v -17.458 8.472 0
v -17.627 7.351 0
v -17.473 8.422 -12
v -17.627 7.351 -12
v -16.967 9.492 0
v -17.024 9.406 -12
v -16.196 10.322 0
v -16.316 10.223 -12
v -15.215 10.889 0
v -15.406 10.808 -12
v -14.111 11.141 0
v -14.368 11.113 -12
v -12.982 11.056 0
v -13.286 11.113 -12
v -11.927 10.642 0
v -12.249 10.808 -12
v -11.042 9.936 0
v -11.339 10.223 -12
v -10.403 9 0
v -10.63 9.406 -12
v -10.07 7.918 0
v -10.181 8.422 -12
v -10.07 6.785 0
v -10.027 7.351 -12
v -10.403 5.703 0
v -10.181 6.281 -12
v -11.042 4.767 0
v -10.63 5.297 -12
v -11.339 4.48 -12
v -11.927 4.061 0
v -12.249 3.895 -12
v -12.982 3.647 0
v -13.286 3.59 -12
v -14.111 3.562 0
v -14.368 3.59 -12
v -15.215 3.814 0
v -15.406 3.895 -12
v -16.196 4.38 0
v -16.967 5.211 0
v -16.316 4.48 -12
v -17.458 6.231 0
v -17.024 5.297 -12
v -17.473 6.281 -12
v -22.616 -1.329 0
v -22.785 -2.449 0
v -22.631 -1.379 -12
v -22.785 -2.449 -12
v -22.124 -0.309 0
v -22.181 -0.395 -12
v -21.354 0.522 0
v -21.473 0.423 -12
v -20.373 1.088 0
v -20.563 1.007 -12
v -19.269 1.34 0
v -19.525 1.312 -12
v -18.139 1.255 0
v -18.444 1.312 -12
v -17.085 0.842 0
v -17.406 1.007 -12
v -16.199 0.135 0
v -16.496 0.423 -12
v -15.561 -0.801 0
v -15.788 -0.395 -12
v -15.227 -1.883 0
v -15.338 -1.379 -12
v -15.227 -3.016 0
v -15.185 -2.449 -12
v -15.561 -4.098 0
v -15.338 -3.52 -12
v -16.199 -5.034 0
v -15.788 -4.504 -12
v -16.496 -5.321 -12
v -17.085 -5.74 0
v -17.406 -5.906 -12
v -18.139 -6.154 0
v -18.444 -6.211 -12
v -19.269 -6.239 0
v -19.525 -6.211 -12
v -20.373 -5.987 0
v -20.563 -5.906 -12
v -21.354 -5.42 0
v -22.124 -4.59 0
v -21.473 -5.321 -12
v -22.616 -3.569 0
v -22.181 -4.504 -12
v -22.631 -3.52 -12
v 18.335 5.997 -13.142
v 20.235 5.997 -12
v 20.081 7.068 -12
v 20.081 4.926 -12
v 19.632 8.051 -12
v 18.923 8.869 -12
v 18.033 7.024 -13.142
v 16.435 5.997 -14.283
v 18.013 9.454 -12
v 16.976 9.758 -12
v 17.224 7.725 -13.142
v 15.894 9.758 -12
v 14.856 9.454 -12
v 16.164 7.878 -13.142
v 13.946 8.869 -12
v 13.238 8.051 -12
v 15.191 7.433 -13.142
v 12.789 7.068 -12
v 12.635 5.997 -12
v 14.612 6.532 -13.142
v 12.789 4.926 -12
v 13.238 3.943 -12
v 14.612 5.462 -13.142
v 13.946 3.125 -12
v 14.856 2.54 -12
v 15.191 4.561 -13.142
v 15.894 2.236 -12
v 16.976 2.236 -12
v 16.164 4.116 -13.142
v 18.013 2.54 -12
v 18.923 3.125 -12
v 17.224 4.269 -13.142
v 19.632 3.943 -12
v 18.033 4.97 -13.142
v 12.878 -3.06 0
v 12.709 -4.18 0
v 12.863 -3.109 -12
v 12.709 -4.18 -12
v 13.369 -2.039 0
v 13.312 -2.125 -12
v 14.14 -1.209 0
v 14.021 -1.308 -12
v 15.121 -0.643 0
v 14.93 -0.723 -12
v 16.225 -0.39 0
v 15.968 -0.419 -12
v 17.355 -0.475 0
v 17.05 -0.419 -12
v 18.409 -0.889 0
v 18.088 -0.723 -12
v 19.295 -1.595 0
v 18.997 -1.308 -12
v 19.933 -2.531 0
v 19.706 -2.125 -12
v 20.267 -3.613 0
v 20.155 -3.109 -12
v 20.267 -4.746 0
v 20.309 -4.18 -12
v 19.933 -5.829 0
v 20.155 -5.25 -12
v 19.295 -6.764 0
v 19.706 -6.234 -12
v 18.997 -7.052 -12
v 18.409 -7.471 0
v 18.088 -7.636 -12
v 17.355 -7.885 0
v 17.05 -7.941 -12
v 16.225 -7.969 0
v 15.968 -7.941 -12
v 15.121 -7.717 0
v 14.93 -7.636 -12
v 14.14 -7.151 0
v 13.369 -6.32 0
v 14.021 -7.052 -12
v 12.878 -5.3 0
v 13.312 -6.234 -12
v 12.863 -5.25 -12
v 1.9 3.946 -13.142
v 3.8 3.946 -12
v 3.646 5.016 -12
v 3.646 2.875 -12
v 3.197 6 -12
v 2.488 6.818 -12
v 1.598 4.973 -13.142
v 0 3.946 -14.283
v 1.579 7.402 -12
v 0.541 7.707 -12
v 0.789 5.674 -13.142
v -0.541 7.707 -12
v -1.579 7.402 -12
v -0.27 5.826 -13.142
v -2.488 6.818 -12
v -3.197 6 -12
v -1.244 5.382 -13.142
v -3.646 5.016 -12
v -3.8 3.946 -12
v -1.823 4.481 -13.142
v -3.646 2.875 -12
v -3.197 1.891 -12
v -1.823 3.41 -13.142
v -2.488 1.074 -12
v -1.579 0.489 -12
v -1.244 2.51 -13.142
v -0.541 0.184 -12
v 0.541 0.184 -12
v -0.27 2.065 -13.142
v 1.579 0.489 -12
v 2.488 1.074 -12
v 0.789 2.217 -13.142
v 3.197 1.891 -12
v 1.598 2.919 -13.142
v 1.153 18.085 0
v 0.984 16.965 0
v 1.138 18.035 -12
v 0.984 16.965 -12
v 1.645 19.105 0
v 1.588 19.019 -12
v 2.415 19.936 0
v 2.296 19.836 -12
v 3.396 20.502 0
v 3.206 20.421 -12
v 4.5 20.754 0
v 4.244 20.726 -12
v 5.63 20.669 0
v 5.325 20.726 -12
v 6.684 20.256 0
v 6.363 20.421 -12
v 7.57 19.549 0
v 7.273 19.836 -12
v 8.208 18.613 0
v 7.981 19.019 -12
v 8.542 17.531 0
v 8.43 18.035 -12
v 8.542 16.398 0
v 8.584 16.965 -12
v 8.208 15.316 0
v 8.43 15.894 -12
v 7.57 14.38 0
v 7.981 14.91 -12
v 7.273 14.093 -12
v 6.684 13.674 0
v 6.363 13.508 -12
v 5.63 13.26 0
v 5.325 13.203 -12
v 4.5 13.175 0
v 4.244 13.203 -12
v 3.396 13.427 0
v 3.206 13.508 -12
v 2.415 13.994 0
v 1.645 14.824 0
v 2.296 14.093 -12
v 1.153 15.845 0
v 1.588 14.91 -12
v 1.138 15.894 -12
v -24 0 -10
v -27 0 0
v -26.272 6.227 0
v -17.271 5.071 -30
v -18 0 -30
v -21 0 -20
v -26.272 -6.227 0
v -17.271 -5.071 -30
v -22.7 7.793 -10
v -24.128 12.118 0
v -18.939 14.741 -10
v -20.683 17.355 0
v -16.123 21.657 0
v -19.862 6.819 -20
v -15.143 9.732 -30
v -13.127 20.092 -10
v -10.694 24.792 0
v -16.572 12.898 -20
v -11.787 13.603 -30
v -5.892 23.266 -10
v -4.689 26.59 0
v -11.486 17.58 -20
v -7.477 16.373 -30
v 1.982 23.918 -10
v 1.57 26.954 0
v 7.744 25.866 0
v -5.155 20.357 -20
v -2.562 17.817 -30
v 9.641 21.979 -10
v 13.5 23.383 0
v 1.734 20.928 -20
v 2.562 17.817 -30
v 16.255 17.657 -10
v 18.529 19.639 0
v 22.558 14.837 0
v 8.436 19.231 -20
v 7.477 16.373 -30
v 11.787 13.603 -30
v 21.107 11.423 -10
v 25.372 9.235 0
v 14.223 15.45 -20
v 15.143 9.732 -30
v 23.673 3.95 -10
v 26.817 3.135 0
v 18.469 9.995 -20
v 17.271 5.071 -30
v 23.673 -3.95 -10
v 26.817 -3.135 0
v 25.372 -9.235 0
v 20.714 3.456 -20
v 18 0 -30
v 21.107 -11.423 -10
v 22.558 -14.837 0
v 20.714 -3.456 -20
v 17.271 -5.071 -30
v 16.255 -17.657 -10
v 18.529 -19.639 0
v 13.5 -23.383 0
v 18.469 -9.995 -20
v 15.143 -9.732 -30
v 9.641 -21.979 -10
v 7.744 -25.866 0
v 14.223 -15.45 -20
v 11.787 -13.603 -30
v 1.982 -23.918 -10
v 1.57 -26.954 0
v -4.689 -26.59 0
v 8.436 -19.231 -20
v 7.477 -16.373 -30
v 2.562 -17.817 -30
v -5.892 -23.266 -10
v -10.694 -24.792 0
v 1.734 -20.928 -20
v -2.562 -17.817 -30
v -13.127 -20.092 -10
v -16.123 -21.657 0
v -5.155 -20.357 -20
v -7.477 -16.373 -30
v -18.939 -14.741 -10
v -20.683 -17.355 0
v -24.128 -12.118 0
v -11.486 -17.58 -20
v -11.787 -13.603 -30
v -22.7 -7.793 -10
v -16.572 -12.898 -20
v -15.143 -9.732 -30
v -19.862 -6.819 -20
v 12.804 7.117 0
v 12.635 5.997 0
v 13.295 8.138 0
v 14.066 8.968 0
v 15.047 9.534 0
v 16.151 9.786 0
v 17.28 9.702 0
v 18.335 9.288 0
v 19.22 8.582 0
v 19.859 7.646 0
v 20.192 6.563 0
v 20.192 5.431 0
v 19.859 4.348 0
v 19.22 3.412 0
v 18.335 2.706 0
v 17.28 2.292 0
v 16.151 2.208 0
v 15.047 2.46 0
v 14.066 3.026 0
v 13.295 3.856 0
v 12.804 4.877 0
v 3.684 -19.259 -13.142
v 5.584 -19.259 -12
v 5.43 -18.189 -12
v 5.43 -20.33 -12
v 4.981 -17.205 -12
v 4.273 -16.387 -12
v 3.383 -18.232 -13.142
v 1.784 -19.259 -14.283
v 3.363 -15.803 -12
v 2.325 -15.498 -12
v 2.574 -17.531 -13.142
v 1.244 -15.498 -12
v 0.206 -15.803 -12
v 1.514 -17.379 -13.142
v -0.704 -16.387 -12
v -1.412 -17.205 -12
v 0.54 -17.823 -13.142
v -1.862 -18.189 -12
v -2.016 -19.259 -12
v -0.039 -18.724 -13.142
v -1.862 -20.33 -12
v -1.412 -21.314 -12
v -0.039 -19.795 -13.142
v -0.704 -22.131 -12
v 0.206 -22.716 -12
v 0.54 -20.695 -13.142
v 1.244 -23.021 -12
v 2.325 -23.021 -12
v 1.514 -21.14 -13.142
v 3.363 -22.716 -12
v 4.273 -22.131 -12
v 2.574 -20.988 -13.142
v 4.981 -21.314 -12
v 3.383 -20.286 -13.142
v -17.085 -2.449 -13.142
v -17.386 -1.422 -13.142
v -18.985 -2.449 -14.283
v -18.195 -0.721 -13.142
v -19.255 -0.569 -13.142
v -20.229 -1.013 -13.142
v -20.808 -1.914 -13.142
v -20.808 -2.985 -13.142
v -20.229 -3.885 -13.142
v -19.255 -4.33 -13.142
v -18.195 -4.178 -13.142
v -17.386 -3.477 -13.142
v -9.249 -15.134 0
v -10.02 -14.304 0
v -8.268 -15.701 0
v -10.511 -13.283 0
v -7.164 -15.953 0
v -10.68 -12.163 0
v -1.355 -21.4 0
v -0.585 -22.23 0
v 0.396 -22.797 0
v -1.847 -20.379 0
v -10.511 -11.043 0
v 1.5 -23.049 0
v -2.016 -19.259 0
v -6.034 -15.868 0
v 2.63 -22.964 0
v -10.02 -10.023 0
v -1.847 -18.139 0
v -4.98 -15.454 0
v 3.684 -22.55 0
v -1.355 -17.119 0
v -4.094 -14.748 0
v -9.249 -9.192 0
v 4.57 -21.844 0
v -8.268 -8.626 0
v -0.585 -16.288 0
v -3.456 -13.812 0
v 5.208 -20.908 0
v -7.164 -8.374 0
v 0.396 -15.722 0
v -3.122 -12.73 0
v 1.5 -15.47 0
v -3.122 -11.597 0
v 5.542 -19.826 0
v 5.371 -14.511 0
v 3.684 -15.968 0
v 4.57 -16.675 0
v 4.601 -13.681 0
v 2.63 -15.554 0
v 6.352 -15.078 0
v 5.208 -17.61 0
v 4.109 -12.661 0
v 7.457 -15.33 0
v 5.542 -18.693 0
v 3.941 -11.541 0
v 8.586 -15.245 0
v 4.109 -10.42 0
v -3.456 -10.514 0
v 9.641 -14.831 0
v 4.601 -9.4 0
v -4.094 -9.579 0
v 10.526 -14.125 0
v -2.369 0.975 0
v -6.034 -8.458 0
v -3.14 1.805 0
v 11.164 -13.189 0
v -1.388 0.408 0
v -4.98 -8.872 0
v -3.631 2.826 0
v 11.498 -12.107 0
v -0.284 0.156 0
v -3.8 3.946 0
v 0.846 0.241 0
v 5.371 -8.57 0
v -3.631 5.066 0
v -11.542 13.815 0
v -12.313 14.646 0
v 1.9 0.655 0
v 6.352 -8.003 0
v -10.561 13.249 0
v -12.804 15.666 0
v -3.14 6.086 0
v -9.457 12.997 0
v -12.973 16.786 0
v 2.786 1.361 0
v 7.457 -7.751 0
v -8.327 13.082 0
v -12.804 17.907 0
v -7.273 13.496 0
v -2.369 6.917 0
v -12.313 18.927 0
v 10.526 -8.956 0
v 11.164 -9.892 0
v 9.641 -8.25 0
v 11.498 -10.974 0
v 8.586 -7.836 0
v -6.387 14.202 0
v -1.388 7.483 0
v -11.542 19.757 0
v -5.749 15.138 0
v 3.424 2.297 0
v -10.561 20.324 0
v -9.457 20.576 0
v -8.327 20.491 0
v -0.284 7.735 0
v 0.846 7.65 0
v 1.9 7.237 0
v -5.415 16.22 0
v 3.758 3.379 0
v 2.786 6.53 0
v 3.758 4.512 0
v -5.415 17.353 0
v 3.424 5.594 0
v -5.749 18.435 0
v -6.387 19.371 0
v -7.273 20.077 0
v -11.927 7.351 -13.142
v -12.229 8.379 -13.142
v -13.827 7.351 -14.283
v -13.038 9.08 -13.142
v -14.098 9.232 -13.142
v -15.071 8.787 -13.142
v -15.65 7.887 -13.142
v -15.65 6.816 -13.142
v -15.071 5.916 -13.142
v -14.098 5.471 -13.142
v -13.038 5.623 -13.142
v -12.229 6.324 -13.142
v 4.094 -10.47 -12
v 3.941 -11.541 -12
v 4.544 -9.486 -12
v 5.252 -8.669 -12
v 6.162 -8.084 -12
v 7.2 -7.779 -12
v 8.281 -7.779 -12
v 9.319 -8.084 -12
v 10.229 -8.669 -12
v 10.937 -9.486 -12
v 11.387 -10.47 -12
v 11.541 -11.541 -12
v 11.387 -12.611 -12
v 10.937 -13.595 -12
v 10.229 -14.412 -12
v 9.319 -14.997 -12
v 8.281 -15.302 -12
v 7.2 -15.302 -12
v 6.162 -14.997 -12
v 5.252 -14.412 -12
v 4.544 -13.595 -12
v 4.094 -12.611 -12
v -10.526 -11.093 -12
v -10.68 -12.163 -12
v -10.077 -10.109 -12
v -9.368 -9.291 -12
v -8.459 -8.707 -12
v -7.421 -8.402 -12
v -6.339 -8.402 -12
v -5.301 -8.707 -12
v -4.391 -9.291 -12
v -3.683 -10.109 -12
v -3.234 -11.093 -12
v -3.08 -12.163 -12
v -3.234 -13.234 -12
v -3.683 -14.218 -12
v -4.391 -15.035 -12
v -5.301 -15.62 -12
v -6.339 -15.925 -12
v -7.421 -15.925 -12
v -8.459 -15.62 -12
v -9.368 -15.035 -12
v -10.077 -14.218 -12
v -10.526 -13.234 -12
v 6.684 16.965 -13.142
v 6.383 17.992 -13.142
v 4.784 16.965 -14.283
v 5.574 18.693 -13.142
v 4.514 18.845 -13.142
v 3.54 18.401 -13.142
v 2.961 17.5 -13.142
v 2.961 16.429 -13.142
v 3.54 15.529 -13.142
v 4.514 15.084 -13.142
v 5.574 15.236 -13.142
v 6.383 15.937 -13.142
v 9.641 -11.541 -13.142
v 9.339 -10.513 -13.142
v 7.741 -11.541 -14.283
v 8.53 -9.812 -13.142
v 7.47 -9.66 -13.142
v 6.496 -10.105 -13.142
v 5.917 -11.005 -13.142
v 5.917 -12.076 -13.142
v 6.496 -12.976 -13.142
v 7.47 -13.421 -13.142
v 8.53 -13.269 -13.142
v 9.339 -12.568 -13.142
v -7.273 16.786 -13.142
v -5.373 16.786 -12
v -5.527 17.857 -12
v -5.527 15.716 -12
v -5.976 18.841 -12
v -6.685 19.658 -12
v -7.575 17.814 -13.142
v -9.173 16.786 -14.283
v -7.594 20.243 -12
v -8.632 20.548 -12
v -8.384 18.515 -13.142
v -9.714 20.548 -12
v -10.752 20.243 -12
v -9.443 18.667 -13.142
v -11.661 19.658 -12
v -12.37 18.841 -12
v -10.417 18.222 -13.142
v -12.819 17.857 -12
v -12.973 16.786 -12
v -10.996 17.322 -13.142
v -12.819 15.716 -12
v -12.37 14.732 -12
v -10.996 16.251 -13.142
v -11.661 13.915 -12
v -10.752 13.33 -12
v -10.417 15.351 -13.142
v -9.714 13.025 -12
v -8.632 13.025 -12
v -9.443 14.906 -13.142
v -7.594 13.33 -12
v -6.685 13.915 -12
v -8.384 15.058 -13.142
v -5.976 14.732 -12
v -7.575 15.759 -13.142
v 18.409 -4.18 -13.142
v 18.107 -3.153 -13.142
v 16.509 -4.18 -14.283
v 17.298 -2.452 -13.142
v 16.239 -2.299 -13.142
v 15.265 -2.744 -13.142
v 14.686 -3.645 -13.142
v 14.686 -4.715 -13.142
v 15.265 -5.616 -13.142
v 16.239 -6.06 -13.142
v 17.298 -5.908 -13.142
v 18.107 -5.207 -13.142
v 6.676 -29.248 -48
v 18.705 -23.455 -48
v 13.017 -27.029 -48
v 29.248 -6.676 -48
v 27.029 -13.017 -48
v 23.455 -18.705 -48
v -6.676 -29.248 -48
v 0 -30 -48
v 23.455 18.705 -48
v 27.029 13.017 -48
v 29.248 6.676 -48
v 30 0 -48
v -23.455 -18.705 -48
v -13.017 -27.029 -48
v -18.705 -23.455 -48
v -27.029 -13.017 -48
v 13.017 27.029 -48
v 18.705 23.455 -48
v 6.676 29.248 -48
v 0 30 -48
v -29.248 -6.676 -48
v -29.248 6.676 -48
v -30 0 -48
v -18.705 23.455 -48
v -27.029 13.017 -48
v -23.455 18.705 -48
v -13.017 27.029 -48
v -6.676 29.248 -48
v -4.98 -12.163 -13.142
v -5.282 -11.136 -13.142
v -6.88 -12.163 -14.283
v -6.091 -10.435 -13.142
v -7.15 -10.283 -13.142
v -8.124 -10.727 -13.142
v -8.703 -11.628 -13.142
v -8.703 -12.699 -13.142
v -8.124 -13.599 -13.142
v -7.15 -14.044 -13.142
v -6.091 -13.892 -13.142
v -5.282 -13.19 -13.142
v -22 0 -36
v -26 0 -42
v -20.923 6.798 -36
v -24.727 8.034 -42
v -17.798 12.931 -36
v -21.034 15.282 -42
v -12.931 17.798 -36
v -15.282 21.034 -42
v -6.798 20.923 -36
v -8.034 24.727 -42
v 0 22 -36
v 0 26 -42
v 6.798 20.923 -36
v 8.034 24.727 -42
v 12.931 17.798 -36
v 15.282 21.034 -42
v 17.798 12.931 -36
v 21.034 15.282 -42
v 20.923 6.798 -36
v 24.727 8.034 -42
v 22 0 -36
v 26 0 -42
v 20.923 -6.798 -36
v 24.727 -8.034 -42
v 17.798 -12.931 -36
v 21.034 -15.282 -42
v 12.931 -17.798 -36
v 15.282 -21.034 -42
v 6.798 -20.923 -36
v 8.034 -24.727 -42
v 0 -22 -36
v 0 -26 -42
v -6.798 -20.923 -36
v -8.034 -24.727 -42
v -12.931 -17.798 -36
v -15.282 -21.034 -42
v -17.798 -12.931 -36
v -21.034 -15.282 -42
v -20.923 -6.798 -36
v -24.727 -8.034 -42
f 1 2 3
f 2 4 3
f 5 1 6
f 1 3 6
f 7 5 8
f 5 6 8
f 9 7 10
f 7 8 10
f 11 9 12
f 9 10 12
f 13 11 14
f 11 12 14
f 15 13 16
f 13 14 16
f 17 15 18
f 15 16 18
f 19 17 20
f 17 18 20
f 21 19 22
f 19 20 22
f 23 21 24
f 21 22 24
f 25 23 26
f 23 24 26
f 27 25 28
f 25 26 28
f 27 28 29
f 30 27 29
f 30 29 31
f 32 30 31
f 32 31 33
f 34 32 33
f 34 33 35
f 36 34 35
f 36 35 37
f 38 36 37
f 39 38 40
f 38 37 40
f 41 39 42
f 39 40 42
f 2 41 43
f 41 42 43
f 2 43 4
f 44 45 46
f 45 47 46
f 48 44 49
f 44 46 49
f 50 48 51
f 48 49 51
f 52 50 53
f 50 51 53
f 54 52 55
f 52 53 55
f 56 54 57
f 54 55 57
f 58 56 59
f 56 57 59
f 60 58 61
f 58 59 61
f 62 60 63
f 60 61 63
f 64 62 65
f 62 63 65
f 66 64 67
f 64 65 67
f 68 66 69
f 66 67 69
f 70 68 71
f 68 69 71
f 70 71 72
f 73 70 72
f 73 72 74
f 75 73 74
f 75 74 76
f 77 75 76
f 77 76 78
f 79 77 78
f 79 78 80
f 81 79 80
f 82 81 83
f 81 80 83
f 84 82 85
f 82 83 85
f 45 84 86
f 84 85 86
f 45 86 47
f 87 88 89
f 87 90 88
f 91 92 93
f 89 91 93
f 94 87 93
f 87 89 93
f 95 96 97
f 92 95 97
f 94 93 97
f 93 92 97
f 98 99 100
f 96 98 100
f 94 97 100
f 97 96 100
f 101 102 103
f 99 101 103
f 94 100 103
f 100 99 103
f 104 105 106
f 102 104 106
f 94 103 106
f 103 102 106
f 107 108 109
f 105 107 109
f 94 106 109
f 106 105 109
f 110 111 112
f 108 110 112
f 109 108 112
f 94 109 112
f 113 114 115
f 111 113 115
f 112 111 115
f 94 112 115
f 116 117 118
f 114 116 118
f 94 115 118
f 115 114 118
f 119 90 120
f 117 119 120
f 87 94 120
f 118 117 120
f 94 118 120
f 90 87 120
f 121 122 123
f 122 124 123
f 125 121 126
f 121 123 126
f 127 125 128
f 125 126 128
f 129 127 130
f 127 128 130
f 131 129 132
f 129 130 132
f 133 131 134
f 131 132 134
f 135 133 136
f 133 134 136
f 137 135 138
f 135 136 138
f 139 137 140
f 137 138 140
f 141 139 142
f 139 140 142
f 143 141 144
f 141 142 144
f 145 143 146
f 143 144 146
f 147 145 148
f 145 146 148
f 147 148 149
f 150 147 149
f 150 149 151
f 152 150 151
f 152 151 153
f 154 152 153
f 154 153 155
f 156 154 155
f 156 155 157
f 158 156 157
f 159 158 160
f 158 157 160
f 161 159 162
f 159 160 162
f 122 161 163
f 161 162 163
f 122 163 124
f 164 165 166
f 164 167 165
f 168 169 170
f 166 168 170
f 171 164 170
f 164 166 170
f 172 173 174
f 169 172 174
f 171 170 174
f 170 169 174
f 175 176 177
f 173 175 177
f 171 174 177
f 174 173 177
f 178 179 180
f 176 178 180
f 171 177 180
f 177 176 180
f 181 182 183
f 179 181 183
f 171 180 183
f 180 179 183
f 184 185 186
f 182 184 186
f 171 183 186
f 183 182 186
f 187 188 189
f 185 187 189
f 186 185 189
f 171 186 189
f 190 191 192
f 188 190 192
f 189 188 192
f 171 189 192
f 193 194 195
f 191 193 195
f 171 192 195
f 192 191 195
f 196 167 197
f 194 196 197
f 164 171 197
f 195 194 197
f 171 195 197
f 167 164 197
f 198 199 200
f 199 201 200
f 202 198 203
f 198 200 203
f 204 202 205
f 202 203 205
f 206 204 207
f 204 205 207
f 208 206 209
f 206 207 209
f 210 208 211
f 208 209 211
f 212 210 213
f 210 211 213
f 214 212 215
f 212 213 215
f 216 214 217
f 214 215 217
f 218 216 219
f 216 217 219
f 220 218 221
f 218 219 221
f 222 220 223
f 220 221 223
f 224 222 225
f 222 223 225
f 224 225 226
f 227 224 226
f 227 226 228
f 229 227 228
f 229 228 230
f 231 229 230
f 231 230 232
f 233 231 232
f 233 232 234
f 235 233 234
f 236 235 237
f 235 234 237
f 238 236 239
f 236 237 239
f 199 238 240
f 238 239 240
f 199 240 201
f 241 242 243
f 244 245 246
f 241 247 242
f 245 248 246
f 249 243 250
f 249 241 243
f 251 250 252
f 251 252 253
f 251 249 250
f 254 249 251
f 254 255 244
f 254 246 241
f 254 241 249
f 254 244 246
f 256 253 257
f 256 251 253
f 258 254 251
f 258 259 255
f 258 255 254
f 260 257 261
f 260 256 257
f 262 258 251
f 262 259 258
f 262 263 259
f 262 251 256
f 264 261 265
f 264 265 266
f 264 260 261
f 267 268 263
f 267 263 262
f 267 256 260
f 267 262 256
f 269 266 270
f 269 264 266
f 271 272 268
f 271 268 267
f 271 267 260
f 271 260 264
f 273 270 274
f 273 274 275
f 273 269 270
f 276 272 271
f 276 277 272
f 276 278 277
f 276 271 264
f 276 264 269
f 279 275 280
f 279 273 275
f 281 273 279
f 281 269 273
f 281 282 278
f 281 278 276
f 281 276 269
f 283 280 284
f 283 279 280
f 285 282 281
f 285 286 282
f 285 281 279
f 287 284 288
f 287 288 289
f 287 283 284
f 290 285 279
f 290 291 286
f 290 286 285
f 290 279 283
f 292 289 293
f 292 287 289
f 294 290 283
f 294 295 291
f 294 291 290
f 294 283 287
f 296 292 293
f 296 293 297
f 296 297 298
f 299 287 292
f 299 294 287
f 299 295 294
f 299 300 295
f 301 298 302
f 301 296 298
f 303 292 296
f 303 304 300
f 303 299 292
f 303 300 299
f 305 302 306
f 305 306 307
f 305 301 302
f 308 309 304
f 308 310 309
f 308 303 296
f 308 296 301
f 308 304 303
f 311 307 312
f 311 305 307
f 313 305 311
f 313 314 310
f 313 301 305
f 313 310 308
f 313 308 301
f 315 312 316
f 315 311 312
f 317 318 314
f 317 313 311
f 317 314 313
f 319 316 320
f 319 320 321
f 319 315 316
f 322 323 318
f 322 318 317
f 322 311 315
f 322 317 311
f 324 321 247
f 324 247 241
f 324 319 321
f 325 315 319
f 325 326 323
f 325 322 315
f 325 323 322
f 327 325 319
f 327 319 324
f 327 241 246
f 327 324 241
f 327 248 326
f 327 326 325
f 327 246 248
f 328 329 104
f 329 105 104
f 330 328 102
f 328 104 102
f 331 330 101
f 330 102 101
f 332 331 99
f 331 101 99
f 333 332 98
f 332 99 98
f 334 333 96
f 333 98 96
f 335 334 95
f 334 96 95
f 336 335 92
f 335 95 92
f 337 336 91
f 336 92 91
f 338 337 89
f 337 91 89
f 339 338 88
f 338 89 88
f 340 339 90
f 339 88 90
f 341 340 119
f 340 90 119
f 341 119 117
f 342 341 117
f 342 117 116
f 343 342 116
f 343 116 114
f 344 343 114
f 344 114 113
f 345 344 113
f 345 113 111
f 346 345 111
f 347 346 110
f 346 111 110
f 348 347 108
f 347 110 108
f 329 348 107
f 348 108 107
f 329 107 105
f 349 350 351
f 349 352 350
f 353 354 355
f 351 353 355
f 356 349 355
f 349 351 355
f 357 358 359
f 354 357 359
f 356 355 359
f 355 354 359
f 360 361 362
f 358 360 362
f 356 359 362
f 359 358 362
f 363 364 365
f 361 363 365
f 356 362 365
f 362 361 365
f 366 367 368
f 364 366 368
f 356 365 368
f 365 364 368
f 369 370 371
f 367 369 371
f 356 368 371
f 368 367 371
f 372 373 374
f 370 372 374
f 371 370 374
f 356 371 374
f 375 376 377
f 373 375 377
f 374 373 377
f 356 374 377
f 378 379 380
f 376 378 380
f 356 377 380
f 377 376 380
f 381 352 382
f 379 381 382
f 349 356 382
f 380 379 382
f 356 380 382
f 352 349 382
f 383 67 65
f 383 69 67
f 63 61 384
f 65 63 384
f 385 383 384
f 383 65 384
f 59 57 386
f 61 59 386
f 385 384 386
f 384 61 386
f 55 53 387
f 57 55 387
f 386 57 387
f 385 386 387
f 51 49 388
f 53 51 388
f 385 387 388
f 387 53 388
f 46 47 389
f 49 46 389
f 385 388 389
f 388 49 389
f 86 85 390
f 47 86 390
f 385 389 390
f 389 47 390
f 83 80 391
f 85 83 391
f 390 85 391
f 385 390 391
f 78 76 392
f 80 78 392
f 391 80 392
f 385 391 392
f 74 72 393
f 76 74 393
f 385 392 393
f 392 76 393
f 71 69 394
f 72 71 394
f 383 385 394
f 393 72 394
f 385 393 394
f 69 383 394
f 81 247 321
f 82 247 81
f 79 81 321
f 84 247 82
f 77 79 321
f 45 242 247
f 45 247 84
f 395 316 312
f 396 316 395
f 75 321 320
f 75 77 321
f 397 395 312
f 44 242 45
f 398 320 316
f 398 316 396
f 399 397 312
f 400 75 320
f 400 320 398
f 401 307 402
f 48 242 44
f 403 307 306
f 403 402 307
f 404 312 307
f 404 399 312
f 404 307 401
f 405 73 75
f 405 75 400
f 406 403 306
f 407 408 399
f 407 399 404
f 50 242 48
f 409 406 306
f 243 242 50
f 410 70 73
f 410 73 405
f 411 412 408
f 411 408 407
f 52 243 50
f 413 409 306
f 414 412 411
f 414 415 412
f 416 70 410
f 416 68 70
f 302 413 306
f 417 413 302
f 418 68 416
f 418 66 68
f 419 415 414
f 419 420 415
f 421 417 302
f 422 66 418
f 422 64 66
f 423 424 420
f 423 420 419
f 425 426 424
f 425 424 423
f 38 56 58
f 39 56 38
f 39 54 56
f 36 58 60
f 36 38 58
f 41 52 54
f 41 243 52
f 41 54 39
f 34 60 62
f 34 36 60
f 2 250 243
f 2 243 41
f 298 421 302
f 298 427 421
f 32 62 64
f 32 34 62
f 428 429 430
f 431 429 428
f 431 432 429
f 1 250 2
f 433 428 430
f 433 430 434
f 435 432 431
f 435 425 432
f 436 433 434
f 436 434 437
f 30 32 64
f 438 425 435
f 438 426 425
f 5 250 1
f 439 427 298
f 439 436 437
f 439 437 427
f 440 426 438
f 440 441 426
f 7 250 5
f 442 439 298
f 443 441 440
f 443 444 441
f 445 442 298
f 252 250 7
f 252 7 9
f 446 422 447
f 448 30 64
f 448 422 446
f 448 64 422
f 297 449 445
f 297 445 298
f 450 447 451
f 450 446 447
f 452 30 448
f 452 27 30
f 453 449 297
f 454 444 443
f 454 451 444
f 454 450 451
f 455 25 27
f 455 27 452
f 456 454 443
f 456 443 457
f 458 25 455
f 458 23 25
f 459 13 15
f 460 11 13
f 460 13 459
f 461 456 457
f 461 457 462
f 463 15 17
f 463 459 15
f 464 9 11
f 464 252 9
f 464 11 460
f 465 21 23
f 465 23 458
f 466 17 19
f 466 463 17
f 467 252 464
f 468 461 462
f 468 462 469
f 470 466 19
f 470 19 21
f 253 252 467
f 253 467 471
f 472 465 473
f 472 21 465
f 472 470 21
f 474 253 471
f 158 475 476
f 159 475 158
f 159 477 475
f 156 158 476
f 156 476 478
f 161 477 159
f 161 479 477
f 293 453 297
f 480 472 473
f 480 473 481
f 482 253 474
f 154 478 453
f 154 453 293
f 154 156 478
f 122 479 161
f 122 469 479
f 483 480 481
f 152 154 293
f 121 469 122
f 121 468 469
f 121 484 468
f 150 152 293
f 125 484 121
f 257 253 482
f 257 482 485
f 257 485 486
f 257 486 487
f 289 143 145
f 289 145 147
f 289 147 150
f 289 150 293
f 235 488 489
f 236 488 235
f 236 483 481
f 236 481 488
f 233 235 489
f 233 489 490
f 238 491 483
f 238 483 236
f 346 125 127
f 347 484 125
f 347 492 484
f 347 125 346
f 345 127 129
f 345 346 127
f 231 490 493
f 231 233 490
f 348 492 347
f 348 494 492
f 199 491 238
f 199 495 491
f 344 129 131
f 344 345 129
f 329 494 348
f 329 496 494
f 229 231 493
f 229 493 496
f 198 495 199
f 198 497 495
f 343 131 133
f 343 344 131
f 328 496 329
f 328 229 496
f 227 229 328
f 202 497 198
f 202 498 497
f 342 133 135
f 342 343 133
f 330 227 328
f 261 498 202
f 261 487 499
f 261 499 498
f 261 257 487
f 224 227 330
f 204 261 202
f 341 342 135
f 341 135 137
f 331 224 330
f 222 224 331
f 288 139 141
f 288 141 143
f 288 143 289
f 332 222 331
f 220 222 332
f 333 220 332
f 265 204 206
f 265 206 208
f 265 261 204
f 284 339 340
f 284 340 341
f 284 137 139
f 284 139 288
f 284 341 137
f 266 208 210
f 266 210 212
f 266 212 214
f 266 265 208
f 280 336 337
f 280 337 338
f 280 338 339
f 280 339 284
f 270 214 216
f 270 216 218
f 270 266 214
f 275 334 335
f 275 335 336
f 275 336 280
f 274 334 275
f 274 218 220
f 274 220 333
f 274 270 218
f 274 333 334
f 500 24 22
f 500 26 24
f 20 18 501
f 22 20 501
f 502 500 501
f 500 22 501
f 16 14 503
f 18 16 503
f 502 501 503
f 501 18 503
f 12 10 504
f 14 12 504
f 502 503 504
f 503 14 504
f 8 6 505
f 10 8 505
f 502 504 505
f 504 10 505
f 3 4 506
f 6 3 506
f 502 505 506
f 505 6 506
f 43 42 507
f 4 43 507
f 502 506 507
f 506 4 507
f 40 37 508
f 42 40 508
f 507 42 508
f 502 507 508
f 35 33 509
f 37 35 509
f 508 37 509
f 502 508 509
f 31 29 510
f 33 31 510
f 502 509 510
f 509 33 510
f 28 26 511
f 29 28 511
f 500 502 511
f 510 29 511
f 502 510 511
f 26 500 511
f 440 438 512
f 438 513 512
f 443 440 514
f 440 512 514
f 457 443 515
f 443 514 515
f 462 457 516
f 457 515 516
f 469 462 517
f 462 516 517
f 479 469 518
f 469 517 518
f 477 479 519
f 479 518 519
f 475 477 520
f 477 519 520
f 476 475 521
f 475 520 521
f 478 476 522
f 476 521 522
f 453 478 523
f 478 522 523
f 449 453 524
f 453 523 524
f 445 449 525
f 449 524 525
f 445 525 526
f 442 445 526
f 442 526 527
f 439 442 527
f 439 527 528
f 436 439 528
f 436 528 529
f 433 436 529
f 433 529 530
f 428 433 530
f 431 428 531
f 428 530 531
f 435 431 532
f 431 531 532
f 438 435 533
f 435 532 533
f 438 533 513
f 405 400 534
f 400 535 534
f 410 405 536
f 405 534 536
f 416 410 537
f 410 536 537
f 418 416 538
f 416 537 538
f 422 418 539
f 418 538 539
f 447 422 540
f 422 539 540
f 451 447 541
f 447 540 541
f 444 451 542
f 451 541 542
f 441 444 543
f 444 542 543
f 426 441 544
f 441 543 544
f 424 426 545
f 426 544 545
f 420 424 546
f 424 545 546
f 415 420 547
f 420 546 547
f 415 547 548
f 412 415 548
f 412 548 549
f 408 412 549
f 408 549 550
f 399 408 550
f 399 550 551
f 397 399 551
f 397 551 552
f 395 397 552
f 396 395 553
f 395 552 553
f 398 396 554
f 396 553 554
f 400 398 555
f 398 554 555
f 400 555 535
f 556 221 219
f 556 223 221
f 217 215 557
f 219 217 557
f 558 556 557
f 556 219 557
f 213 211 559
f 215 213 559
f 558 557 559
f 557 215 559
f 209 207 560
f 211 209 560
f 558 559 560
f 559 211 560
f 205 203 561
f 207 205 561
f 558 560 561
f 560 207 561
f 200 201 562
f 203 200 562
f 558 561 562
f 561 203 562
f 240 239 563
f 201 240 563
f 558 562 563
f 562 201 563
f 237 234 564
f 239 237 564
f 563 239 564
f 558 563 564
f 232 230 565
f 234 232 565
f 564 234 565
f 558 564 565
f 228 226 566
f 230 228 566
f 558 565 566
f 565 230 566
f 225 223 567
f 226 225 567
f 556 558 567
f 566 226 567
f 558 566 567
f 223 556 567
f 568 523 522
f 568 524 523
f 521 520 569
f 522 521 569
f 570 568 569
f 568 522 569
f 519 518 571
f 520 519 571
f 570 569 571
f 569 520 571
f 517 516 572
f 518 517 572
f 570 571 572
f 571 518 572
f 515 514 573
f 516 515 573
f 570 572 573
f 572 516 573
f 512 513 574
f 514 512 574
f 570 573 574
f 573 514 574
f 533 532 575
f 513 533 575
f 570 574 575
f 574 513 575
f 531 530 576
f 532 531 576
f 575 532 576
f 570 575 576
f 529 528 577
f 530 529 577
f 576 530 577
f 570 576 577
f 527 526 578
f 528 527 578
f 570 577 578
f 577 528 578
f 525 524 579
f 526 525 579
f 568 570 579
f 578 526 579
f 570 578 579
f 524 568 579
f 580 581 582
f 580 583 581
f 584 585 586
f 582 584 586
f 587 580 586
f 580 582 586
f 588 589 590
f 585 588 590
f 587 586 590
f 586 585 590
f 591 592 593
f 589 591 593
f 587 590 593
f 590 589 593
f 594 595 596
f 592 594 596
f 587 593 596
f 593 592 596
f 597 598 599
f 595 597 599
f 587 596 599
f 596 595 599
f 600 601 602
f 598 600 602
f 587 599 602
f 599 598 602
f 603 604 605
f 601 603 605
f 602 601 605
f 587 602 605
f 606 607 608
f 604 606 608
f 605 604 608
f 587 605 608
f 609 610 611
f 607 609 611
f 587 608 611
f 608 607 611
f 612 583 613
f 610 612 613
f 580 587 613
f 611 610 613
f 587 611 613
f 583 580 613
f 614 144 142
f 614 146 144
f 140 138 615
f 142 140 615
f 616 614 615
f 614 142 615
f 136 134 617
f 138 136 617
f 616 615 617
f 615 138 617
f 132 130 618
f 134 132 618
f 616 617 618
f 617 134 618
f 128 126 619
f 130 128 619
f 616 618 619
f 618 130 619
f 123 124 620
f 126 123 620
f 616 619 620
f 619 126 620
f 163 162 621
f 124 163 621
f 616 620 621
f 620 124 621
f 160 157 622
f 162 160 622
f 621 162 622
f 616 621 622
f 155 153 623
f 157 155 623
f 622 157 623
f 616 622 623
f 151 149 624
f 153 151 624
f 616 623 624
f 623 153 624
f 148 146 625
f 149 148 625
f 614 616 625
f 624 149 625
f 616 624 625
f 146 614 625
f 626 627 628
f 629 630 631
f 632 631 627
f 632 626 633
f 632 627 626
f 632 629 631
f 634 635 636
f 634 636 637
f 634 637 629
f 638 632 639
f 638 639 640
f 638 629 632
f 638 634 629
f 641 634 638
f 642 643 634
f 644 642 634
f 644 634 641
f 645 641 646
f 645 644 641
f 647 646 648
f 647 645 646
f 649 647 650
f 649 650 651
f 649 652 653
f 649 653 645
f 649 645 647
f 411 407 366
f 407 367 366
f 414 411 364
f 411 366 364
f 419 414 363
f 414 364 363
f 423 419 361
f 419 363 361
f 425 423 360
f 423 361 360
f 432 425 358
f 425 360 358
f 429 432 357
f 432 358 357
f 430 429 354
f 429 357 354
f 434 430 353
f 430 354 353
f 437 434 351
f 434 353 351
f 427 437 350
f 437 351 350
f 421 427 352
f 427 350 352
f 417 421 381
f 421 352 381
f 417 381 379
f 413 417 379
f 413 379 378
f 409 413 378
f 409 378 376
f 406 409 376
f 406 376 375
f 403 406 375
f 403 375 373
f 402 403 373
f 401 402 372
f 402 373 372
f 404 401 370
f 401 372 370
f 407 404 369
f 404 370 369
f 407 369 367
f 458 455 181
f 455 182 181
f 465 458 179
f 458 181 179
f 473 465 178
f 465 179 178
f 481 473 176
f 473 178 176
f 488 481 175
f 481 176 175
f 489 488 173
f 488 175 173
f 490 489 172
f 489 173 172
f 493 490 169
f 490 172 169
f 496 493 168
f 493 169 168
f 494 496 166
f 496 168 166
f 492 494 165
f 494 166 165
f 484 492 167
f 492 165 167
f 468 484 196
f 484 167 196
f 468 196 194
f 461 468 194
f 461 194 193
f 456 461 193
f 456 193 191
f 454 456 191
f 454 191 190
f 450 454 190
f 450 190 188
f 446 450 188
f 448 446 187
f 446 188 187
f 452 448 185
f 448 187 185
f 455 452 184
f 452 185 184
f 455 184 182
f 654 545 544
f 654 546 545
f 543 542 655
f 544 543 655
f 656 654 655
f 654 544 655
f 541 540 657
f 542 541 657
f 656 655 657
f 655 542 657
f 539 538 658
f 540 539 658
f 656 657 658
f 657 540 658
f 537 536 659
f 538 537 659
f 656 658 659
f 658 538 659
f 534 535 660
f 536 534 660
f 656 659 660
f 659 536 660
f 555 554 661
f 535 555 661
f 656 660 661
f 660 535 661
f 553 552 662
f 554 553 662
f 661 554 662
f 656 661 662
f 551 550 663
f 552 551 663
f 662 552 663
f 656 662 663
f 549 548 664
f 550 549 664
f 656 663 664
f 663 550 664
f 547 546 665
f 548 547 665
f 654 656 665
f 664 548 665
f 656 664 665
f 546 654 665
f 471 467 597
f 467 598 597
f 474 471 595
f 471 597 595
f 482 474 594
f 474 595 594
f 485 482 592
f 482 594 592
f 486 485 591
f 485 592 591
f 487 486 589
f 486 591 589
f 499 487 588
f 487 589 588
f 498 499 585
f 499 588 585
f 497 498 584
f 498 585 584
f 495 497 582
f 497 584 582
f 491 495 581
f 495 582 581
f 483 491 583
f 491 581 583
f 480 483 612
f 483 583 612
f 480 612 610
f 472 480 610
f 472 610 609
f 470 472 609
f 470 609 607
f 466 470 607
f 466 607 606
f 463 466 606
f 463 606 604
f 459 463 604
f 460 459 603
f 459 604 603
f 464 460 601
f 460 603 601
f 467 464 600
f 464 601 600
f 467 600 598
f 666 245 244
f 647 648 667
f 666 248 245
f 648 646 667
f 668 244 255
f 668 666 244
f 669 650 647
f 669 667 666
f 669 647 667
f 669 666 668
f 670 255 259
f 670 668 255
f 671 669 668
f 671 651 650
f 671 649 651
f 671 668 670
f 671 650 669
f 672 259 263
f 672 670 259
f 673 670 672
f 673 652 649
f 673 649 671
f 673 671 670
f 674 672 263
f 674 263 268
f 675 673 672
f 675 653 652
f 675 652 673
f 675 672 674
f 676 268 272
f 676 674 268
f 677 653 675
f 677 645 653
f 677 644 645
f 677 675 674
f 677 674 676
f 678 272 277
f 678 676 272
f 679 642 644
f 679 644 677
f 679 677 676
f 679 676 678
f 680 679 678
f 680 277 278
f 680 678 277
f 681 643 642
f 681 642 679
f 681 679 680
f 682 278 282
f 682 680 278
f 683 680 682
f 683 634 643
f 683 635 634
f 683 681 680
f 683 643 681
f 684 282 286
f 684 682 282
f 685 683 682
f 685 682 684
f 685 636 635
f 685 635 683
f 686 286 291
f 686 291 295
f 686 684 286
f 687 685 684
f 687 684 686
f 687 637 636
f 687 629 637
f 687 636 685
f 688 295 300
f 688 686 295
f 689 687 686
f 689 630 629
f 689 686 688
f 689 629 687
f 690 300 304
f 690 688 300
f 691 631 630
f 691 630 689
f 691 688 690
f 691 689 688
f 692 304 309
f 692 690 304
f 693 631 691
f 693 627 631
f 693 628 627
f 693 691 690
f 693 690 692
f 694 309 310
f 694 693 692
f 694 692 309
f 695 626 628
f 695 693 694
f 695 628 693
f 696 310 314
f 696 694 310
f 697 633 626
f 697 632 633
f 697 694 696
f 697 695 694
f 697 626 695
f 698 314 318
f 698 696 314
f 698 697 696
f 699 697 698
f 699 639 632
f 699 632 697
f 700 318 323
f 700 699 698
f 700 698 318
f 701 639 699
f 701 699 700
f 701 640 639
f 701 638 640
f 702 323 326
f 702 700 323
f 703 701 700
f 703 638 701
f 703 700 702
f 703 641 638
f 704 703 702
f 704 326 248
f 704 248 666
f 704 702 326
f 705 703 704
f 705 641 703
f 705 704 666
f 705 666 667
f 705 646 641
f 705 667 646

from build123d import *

# Parameters (mm, degrees)
F3_D     = 7.6
F3_DEPTH = 12
F3_TIP   = 2.2832703523
F5_D     = 7.6
F5_DEPTH = 12
F5_TIP   = 2.2832703523


with BuildPart() as f1:
    # F0 (on Front) → F1 (revolve)
    with BuildSketch(Plane.XZ):
        Polygon((-18, -30.0000015049), (-30, -48.0000015049), (0, -48.0000015049), (0, 0), (-27, 0), align=None)
    revolve(axis=Axis((0, 0, -24.0000007525), (0, 0, -1)))

    # F3
    with Locations(Plane.XY):
        with Locations((4.7843093053, 16.9646441936), (0, 3.9457264356), (16.4348743856, 5.9969499707), (-9.1730067506, 16.7864412069), (7.7405036427, -11.5405060351), (-6.8799313158, -12.1632143855), (-18.984535709, -2.4492875673)):
            Hole(F3_D / 2, depth=F3_DEPTH)
            with Locations((0, 0, -(F3_DEPTH + F3_TIP / 2))):  # 118° drill point
                Cone(0, F3_D / 2, F3_TIP, mode=Mode.SUBTRACT)

    # F5
    with Locations(Plane.XY):
        with Locations((-13.827174902, 7.3514520191), (1.784414053, -19.2592125386), (16.5089797229, -4.1798353195)):
            Hole(F5_D / 2, depth=F5_DEPTH)
            with Locations((0, 0, -(F5_DEPTH + F5_TIP / 2))):  # 118° drill point
                Cone(0, F5_D / 2, F5_TIP, mode=Mode.SUBTRACT)


solid = f1.part
